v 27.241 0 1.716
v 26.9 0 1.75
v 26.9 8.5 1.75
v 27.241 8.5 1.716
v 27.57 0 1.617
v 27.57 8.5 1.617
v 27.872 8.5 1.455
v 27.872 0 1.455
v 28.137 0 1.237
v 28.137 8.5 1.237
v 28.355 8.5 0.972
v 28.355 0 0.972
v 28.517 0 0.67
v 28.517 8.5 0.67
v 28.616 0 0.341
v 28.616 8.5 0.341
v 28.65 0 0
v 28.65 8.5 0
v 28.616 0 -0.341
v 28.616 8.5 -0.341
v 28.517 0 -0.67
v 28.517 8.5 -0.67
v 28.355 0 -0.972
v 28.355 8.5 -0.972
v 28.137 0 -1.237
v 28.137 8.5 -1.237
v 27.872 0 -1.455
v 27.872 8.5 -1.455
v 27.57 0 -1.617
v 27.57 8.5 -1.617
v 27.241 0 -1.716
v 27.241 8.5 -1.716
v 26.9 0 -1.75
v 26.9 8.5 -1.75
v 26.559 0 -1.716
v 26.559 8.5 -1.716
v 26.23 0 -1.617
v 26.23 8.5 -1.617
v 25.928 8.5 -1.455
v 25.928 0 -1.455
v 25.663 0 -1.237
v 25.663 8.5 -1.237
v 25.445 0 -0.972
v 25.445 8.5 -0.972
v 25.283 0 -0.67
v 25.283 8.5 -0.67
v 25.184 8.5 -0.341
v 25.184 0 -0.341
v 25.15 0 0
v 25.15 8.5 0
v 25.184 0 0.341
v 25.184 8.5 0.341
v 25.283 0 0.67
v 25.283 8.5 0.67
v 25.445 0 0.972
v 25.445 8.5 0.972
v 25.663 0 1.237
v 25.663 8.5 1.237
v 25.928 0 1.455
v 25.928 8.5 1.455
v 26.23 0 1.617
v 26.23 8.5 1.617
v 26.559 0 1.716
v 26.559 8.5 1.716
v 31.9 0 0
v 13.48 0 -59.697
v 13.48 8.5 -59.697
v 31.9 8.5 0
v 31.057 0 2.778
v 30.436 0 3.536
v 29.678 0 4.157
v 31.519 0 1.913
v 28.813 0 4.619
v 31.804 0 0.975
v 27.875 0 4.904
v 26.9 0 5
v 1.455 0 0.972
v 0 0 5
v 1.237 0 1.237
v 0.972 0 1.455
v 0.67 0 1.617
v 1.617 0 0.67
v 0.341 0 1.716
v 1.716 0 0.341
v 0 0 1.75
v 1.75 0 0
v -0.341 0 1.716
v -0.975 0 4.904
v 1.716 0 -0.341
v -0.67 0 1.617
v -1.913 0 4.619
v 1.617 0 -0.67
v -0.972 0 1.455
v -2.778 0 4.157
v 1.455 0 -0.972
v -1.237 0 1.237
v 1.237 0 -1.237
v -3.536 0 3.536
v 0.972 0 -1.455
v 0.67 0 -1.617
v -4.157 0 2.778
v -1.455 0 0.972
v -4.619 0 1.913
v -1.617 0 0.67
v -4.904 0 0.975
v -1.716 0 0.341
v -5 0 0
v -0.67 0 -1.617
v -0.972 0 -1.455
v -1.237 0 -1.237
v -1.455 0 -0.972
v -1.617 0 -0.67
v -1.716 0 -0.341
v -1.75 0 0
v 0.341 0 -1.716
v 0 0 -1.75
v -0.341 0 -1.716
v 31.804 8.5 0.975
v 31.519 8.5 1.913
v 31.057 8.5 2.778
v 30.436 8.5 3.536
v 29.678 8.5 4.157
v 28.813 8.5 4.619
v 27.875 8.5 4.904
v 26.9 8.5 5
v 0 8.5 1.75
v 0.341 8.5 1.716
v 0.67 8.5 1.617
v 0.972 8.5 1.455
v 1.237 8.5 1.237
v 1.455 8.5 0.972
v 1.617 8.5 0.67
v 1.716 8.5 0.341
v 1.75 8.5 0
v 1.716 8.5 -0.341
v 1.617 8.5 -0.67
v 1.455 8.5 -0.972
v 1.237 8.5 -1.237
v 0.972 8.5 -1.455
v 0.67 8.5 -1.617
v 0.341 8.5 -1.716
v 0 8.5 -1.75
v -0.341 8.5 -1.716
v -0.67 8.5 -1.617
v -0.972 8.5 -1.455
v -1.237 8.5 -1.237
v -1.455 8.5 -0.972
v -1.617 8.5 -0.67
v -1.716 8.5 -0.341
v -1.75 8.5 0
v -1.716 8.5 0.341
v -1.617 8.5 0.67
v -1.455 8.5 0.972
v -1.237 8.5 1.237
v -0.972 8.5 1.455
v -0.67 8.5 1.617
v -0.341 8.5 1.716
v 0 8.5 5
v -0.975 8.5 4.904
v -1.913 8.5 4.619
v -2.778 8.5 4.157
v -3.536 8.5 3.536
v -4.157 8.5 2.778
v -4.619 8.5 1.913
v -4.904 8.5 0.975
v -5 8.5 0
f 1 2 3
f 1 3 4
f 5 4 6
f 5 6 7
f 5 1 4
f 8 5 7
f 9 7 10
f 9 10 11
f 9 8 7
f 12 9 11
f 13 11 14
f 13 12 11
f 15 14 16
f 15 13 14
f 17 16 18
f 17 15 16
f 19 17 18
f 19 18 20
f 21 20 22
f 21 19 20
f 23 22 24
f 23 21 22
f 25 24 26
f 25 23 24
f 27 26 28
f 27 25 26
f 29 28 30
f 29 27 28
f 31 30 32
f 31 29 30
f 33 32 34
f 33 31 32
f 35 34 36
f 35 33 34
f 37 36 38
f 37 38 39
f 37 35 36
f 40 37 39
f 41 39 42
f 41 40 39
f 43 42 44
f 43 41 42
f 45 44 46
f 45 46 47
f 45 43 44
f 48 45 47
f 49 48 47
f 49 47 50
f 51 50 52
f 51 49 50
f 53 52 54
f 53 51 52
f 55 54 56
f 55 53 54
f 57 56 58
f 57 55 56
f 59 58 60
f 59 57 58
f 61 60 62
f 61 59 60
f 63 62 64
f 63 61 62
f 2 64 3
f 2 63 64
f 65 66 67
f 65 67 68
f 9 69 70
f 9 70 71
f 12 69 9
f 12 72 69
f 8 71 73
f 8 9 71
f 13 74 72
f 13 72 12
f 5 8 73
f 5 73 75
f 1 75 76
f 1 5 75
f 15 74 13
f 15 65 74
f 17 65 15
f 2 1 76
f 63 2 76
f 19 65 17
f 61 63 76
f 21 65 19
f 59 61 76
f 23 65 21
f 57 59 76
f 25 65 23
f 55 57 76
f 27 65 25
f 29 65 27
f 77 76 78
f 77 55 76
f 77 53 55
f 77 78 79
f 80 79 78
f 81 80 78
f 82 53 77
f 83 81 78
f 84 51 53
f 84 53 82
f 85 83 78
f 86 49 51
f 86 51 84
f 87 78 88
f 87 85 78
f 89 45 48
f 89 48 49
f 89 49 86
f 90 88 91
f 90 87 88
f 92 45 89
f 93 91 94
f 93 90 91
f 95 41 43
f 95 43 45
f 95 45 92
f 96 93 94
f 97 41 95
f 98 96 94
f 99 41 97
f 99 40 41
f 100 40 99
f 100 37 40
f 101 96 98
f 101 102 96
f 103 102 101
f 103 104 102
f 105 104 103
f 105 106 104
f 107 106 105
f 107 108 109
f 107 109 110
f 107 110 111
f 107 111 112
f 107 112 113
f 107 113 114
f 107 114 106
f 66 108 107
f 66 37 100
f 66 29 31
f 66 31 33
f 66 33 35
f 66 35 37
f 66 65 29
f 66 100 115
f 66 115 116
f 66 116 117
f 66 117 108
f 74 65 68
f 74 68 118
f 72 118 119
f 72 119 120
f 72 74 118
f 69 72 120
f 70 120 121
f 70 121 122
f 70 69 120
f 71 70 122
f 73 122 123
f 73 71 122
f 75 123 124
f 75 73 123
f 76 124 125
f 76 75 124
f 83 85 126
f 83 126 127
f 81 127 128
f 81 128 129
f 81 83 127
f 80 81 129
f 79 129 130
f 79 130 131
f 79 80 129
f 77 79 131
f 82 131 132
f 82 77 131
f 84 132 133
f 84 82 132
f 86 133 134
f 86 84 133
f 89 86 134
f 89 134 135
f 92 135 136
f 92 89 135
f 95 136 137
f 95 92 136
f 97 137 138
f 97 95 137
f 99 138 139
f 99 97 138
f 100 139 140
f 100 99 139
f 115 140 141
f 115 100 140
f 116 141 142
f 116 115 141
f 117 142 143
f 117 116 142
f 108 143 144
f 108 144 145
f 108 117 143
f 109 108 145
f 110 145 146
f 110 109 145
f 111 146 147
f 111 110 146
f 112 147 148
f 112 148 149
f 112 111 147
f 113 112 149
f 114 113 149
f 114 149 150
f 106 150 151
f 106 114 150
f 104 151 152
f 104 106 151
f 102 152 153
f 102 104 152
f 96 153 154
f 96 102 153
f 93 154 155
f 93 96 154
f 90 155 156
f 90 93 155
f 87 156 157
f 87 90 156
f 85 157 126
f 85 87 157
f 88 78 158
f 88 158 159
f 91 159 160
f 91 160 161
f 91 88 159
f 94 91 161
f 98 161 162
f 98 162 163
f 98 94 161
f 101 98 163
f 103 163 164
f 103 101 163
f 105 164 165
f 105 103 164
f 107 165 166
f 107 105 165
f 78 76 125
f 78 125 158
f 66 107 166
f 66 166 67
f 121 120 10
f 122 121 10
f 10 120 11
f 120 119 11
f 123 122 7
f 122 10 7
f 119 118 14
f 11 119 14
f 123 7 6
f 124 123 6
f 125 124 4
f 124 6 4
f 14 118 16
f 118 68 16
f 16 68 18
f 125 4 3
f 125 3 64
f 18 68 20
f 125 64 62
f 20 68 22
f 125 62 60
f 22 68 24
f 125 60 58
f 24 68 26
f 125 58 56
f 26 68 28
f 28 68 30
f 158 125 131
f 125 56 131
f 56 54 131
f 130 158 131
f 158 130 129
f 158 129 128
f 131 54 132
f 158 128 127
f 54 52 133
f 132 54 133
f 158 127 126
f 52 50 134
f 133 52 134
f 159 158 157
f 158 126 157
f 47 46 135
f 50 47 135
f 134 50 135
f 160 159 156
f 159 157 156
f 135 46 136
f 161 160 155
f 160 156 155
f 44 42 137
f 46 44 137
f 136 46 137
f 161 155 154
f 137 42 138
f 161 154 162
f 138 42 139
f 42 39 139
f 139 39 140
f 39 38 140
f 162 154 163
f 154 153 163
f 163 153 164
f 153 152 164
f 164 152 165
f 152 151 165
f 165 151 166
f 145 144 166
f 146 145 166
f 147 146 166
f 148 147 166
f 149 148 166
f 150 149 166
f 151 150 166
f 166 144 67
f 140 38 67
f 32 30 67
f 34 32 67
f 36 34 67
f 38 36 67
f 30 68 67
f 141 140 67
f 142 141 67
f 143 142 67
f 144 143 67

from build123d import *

# Parameters (mm, degrees)
SKETCH1_R           = 1.75
BOSS_EXTRUDE3_DEPTH = 8.5


with BuildPart() as part:
    # Sketch1 → Boss-Extrude3 (new body)
    with BuildSketch(Plane(origin=(0, 0, 0), x_dir=(1, 0, 0), z_dir=(0, 1, 0))):
        with BuildLine():
            Line((-5, 0), (13.479806433, 59.697025207))
            Line((13.479806433, 59.697025207), (31.9, 0))
            ThreePointArc((31.9, 0), (30.435533906, -3.535533906), (26.9, -5))
            Line((26.9, -5), (0, -5))
            ThreePointArc((0, -5), (-3.535533906, -3.535533906), (-5, 0))
        make_face()
        with Locations(Location((0, 0, 0), (0, 0, 270))):
            Circle(SKETCH1_R, mode=Mode.SUBTRACT)
        with Locations(Location((26.9, 0, 0), (0, 0, 270))):
            Circle(SKETCH1_R, mode=Mode.SUBTRACT)
    extrude(amount=BOSS_EXTRUDE3_DEPTH)


solid = part.part
